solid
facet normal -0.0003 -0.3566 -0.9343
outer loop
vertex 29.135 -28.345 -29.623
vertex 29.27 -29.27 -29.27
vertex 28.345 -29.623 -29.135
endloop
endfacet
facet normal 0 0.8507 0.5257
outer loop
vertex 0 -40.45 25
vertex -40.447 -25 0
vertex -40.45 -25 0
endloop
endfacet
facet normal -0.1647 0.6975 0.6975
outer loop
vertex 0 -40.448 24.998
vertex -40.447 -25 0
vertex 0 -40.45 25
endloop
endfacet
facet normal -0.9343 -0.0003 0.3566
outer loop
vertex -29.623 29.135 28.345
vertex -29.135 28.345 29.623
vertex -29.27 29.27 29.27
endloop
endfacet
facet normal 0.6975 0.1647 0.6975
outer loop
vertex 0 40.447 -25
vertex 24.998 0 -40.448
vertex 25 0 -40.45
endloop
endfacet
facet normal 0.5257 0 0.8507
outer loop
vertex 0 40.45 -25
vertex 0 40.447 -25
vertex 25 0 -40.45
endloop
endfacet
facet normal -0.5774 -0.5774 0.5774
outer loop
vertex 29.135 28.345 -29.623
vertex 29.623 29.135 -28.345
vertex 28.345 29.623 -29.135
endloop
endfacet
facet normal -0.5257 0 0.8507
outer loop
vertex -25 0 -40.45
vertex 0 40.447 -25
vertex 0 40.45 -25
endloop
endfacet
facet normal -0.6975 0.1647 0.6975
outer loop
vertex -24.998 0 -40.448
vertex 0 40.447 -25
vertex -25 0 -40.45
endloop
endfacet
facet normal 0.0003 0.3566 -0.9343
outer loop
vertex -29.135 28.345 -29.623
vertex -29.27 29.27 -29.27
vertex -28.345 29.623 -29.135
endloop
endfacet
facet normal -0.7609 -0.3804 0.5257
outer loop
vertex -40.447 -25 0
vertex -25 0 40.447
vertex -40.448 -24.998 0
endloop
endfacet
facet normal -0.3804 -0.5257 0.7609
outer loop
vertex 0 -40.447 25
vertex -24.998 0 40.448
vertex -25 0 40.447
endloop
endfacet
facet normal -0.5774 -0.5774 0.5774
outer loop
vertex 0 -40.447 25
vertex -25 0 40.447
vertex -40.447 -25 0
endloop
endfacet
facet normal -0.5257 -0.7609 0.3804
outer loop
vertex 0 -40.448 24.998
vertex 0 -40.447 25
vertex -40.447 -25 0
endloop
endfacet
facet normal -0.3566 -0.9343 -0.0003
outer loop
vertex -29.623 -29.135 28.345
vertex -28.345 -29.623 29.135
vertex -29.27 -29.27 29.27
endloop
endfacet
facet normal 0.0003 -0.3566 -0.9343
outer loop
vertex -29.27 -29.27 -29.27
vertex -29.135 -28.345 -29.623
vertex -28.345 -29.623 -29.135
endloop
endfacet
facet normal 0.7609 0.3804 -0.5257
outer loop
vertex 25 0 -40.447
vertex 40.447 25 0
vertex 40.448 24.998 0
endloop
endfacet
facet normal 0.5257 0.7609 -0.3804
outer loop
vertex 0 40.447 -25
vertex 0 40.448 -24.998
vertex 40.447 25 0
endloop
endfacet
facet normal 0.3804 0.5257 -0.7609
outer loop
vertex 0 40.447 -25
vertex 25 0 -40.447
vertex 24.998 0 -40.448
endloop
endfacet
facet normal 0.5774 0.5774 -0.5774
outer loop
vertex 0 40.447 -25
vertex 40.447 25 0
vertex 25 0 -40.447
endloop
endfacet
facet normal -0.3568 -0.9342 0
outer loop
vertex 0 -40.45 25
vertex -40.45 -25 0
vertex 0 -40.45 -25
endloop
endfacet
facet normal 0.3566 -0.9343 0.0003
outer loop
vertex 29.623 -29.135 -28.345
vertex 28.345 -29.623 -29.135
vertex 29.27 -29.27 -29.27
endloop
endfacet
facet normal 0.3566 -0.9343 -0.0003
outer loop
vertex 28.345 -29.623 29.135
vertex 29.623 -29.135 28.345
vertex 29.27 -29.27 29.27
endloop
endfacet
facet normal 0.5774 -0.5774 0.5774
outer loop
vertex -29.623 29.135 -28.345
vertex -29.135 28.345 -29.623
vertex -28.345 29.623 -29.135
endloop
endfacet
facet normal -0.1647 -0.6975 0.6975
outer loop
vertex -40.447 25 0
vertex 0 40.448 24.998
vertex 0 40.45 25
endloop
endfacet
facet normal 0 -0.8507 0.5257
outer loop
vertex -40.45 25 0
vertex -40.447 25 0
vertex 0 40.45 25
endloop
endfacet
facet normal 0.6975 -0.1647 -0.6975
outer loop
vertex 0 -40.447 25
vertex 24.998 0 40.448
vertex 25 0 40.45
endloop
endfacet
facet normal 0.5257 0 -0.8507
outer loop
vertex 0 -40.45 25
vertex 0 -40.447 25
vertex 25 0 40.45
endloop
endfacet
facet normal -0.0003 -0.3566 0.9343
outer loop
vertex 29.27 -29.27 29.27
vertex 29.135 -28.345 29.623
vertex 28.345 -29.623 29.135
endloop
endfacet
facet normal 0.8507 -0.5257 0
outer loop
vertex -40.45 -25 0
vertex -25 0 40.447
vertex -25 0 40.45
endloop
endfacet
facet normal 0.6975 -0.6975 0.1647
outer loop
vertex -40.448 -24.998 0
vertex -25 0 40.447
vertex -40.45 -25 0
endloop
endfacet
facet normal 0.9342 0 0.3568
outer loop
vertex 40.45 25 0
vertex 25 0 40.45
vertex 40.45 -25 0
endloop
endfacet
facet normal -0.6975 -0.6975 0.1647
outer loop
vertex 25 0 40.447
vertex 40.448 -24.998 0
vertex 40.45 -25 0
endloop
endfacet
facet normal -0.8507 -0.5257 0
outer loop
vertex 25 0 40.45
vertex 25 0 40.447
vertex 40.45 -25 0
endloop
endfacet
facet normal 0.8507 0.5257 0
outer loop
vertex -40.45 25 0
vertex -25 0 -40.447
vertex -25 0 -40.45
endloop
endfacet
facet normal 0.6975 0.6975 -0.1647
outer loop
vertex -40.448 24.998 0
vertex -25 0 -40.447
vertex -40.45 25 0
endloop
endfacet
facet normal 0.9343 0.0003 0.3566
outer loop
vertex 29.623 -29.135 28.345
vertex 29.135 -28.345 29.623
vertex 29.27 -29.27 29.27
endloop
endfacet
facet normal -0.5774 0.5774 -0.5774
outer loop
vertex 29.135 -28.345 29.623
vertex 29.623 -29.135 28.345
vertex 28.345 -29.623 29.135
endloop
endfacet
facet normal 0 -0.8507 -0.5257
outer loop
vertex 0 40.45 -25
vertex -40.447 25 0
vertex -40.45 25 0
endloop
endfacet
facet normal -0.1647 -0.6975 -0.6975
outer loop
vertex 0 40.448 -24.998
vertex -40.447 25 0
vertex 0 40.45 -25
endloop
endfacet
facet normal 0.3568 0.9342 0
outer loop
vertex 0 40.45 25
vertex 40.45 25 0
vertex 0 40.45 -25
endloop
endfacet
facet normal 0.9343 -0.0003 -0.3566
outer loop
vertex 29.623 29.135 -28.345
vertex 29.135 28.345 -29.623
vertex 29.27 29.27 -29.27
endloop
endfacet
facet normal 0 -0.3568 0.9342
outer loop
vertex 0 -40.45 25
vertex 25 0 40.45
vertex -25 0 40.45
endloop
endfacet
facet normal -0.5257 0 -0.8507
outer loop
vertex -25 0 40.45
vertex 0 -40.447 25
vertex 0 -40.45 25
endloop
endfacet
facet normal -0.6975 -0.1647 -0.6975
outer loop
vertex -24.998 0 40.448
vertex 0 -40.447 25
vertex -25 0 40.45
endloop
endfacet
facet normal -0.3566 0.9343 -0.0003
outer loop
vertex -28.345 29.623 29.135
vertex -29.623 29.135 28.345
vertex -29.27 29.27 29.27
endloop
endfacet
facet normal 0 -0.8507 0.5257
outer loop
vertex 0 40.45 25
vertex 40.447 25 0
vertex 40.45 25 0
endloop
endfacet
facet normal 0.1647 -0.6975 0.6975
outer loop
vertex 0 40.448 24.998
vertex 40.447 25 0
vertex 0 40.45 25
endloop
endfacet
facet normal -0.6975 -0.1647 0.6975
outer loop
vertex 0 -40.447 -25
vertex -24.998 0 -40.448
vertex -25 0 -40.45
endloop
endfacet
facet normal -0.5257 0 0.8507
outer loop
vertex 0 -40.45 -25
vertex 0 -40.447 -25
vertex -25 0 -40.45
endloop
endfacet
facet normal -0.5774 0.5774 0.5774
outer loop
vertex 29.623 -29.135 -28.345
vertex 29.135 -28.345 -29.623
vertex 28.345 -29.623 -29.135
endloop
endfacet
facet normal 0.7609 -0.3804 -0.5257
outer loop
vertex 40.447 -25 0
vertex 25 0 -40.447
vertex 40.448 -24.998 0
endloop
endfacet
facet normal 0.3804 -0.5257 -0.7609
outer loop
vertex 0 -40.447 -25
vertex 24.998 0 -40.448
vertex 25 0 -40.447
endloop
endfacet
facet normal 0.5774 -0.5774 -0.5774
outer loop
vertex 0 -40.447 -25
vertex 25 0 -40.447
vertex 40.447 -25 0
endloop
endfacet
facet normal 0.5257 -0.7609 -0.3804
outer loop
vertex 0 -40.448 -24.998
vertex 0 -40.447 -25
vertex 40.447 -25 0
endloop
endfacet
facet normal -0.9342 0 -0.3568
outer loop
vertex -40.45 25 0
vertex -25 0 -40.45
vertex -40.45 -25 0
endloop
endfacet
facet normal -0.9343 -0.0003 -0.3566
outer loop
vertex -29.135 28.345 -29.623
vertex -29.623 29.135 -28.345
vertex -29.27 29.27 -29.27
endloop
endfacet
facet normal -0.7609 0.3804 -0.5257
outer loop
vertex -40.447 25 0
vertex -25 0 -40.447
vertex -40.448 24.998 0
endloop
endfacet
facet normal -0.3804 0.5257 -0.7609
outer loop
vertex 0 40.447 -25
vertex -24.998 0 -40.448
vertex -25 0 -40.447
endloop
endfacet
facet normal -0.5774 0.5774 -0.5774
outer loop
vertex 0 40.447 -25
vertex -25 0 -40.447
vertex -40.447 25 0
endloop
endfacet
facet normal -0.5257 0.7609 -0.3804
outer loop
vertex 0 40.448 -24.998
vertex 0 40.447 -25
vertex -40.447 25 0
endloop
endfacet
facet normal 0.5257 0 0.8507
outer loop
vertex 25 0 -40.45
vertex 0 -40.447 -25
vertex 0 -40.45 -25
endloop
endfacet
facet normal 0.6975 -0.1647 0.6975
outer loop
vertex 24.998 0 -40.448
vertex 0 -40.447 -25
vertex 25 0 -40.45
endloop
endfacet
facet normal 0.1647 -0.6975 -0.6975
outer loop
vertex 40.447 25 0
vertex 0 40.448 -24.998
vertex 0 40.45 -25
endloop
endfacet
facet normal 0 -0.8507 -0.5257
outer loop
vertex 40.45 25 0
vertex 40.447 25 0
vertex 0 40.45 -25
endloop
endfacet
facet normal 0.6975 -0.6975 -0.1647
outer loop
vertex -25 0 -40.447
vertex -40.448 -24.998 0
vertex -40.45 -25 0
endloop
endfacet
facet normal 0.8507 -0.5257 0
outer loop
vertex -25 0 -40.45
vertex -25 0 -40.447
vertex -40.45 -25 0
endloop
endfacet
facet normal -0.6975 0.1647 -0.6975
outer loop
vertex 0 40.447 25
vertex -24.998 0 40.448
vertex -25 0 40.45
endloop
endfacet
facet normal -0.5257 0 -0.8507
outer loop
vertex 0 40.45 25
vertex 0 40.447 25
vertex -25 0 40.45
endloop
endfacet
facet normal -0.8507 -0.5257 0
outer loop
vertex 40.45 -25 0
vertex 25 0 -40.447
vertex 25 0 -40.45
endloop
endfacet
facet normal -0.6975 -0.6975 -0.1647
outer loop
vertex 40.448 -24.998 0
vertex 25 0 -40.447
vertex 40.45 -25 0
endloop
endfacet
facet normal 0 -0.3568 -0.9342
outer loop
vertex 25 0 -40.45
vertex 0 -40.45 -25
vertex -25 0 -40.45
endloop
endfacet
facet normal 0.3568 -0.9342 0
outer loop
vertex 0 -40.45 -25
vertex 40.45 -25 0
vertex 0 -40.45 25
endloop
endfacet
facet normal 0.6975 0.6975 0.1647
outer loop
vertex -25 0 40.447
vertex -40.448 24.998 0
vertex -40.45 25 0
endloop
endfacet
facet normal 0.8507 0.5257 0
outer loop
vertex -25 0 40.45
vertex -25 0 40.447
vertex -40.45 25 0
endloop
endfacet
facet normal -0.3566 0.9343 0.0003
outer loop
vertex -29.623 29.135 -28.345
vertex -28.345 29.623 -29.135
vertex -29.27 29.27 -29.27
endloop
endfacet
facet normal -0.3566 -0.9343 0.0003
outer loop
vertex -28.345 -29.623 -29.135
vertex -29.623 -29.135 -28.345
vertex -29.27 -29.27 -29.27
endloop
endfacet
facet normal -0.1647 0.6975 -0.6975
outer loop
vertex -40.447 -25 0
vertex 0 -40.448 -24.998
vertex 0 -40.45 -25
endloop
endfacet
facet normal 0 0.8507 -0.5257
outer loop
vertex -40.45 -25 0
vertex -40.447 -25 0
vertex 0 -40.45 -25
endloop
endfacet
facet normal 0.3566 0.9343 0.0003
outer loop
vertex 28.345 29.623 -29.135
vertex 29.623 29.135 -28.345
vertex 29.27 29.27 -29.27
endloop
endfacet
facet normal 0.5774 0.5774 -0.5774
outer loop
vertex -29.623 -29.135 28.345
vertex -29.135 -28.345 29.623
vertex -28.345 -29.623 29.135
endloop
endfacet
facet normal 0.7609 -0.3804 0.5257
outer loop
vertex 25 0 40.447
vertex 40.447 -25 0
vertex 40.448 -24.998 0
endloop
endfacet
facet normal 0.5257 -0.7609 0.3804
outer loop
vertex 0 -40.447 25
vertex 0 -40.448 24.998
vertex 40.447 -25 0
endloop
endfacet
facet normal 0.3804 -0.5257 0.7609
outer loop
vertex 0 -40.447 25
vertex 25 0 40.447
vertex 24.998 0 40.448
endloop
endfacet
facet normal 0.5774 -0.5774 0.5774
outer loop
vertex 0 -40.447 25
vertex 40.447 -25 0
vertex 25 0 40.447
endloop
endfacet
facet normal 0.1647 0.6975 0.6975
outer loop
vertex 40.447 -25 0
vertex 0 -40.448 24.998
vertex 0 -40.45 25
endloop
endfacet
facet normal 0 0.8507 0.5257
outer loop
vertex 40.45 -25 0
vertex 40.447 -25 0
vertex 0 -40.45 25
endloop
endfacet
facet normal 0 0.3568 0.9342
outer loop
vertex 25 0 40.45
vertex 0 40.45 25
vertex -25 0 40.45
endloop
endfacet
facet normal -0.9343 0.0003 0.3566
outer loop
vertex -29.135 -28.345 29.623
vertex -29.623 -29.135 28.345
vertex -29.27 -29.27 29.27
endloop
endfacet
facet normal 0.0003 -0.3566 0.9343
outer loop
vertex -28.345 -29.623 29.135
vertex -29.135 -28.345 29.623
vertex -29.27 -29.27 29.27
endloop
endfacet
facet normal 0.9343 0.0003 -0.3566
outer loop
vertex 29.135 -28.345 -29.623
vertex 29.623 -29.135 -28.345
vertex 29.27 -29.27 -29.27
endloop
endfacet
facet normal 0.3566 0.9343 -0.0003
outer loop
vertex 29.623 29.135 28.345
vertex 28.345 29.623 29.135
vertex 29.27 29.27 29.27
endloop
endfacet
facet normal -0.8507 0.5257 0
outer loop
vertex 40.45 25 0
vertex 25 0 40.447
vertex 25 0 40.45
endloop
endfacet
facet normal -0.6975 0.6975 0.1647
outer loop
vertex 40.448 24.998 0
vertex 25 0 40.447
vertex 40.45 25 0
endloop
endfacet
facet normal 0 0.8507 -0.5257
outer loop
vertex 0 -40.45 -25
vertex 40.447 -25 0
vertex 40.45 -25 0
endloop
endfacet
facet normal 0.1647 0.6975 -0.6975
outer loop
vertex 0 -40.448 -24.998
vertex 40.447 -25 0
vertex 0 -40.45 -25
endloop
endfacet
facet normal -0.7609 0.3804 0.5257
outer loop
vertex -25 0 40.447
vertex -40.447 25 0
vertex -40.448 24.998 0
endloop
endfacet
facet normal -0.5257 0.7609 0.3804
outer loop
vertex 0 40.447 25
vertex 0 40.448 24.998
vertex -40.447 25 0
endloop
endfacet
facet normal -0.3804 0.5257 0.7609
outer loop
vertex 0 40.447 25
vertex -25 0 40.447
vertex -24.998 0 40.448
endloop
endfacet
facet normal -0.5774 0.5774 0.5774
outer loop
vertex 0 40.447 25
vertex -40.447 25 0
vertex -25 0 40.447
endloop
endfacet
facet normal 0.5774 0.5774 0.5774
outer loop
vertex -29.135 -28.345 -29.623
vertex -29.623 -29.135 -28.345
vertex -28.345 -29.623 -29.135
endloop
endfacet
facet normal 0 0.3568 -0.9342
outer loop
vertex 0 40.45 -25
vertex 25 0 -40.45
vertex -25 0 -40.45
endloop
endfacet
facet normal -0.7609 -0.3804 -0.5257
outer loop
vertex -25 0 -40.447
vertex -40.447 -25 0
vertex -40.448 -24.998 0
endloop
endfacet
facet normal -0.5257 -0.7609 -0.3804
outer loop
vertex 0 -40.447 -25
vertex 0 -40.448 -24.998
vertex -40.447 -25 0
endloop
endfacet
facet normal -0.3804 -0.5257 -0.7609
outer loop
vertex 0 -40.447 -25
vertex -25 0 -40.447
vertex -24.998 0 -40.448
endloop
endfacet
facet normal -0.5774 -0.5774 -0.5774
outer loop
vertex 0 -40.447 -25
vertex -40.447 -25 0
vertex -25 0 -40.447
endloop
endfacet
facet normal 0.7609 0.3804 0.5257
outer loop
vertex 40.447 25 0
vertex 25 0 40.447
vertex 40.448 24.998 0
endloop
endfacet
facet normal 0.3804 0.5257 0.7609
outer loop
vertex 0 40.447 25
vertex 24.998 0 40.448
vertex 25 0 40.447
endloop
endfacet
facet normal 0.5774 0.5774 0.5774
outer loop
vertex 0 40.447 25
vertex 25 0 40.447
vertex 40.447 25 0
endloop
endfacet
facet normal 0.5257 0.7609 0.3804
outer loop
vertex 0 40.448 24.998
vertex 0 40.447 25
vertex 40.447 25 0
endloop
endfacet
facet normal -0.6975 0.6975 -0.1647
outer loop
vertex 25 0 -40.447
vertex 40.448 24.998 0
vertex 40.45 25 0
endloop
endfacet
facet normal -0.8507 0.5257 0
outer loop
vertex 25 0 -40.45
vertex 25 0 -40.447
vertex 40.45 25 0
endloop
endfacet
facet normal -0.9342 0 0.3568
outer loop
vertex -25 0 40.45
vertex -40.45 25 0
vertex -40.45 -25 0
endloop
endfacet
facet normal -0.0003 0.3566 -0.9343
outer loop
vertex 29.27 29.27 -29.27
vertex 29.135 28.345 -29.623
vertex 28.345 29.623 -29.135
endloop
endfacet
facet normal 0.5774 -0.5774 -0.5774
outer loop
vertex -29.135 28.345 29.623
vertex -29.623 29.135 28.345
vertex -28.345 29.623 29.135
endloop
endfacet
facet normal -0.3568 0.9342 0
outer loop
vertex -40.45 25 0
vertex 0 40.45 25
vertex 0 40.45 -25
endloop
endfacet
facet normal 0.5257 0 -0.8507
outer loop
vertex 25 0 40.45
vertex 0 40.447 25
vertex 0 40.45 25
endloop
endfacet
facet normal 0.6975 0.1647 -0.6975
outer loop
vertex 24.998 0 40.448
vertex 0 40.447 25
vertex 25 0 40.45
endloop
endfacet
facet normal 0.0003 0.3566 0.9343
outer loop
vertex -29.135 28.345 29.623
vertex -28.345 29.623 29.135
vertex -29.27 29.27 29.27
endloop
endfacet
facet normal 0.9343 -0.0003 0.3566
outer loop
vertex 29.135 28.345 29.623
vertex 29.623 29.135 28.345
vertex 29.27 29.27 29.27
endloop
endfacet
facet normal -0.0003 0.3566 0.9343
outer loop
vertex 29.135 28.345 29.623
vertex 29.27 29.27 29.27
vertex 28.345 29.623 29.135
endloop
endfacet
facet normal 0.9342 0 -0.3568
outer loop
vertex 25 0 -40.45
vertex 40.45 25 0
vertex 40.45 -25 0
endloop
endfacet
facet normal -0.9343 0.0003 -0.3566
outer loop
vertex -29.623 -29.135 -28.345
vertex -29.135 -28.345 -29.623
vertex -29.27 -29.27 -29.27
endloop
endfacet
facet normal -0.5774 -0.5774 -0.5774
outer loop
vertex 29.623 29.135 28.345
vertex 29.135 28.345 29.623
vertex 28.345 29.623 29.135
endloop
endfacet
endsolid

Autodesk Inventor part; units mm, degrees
ref_plane "YZ Plane" through (0, 0, 0) normal (1, 0, 0) x (0, 1, 0)
ref_plane "XZ Plane" through (0, 0, 0) normal (0, 1, 0) x (-1, 0, 0)
ref_plane "XY Plane" through (0, 0, 0) normal (0, 0, 1) x (1, 0, 0)
sketch "Sketch1" plane through (0, 0, 0) normal (0, 0, 1) x (1, 0, 0)
  line L0 (0, 0) -> (40.45, 0)
  line L1 (40.45, 0) -> (40.45, 40.45)
  line L2 (40.45, 40.45) -> (0, 40.45)
  line L3 (0, 40.45) -> (0, 0)
  dimension "d1" = 40.45
  dimension "d2" = 40.45
extrude "InitialCube" add sketch "Sketch1" along normal blind 40.45
sketch "Sketch2" plane through (40.45, 0, 0) normal (1, 0, 0) x (0, 0, -1)
  line L0 (-40.45, 0) -> (-40.45, 40.45)
  line L1 (-40.45, 40.45) -> (-25, 40.45)
  line L2 (-25, 40.45) -> (-40.45, 0)
  line L3 (0, 40.45) -> (-40.45, 40.45) projected
  line L4 (-40.45, 0) -> (-40.45, 40.45) projected
  point P0 (0, 0)
  dimension "d5" = 15.45
extrude "YZ Trim" cut sketch "Sketch2" against normal blind 40.45
sketch "Sketch3" plane through (0, 0, 0) normal (0, -1, 0) x (1, 0, 0)
  line L0 (40.45, 0) -> (40.45, 40.45) projected
  line L1 (40.45, 40.45) -> (40.45, 0)
  line L2 (40.45, 0) -> (25, 40.45)
  line L3 (25, 40.45) -> (40.45, 40.45)
  point P0 (0, 0)
  dimension "d9" = 15.45
extrude "XZ Trim" cut sketch "Sketch3" against normal blind 40.45
sketch "Sketch4" plane through (0, 0, 0) normal (0, 0, -1) x (-1, 0, 0)
  line L0 (0, 40.45) -> (0, 0) projected
  line L1 (-40.45, 40.45) -> (0, 40.45) projected
  line L2 (0, 40.45) -> (-40.45, 40.45)
  line L3 (-40.45, 40.45) -> (-40.45, 25)
  line L4 (-40.45, 0) -> (-40.45, 40.45) projected
  line L5 (0, 40.45) -> (-40.45, 25)
  dimension "d12" = 15.45
extrude "XY Trim" cut sketch "Sketch4" against normal blind 40.45
ref_plane "XYZ Work Plane" through (25, 0, 40.45) normal (0.5774, 0.5774, 0.5774) x (0.309, 0.5, -0.809)
sketch "Sketch6" plane through (25, 0, 40.45) normal (0.5774, 0.5774, 0.5774) x (0.309, 0.5, -0.809)
  line L0 (0, 0) -> (49.999, 0)
  line L1 (49.999, 0) -> (24.9995, 43.3004)
  line L2 (24.9995, 43.3004) -> (0, 0)
  point P0 (24.9995, 14.4335)
extrude "XYZ Trim" cut sketch "Sketch6" along normal blind 12.5
mirror "Quarter Mirror" about plane through (20.225, 20.225, 0) normal (0, 0, -1) of "InitialCube", "XZ Trim", "XY Trim", "XYZ Trim", "YZ Trim"
mirror "Half Mirror" about plane through (0, 40.45, 0) normal (-1, 0, 0) of "InitialCube", "YZ Trim", "XZ Trim", "XY Trim", "XYZ Trim", "Quarter Mirror"
mirror "Full Mirror" about plane through (0, 0, 0) normal (0, -1, 0) of "Quarter Mirror", "InitialCube", "XZ Trim", "XY Trim", "XYZ Trim", "YZ Trim", "Half Mirror"
equation "\"d1\" = PhiLength"
equation "\"d2\" = PhiLength"
equation "\"d3\" = PhiLength"
equation "\"d5\" = SideDiff"
equation "\"d7\" = PhiLength"
equation "\"d9\" = SideDiff"
equation "\"d10\" = PhiLength"
equation "\"d12\" = SideDiff"
equation "\"d13\" = PhiLength"
equation "\"d16\" = 0.5 * SideLength"
equation "\"SideLength\" = 25"
equation "\"PhiLength\" = 1.618 * SideLength"
equation "\"SideDiff\" = PhiLength - SideLength"
properties part number "Icosahedron"
